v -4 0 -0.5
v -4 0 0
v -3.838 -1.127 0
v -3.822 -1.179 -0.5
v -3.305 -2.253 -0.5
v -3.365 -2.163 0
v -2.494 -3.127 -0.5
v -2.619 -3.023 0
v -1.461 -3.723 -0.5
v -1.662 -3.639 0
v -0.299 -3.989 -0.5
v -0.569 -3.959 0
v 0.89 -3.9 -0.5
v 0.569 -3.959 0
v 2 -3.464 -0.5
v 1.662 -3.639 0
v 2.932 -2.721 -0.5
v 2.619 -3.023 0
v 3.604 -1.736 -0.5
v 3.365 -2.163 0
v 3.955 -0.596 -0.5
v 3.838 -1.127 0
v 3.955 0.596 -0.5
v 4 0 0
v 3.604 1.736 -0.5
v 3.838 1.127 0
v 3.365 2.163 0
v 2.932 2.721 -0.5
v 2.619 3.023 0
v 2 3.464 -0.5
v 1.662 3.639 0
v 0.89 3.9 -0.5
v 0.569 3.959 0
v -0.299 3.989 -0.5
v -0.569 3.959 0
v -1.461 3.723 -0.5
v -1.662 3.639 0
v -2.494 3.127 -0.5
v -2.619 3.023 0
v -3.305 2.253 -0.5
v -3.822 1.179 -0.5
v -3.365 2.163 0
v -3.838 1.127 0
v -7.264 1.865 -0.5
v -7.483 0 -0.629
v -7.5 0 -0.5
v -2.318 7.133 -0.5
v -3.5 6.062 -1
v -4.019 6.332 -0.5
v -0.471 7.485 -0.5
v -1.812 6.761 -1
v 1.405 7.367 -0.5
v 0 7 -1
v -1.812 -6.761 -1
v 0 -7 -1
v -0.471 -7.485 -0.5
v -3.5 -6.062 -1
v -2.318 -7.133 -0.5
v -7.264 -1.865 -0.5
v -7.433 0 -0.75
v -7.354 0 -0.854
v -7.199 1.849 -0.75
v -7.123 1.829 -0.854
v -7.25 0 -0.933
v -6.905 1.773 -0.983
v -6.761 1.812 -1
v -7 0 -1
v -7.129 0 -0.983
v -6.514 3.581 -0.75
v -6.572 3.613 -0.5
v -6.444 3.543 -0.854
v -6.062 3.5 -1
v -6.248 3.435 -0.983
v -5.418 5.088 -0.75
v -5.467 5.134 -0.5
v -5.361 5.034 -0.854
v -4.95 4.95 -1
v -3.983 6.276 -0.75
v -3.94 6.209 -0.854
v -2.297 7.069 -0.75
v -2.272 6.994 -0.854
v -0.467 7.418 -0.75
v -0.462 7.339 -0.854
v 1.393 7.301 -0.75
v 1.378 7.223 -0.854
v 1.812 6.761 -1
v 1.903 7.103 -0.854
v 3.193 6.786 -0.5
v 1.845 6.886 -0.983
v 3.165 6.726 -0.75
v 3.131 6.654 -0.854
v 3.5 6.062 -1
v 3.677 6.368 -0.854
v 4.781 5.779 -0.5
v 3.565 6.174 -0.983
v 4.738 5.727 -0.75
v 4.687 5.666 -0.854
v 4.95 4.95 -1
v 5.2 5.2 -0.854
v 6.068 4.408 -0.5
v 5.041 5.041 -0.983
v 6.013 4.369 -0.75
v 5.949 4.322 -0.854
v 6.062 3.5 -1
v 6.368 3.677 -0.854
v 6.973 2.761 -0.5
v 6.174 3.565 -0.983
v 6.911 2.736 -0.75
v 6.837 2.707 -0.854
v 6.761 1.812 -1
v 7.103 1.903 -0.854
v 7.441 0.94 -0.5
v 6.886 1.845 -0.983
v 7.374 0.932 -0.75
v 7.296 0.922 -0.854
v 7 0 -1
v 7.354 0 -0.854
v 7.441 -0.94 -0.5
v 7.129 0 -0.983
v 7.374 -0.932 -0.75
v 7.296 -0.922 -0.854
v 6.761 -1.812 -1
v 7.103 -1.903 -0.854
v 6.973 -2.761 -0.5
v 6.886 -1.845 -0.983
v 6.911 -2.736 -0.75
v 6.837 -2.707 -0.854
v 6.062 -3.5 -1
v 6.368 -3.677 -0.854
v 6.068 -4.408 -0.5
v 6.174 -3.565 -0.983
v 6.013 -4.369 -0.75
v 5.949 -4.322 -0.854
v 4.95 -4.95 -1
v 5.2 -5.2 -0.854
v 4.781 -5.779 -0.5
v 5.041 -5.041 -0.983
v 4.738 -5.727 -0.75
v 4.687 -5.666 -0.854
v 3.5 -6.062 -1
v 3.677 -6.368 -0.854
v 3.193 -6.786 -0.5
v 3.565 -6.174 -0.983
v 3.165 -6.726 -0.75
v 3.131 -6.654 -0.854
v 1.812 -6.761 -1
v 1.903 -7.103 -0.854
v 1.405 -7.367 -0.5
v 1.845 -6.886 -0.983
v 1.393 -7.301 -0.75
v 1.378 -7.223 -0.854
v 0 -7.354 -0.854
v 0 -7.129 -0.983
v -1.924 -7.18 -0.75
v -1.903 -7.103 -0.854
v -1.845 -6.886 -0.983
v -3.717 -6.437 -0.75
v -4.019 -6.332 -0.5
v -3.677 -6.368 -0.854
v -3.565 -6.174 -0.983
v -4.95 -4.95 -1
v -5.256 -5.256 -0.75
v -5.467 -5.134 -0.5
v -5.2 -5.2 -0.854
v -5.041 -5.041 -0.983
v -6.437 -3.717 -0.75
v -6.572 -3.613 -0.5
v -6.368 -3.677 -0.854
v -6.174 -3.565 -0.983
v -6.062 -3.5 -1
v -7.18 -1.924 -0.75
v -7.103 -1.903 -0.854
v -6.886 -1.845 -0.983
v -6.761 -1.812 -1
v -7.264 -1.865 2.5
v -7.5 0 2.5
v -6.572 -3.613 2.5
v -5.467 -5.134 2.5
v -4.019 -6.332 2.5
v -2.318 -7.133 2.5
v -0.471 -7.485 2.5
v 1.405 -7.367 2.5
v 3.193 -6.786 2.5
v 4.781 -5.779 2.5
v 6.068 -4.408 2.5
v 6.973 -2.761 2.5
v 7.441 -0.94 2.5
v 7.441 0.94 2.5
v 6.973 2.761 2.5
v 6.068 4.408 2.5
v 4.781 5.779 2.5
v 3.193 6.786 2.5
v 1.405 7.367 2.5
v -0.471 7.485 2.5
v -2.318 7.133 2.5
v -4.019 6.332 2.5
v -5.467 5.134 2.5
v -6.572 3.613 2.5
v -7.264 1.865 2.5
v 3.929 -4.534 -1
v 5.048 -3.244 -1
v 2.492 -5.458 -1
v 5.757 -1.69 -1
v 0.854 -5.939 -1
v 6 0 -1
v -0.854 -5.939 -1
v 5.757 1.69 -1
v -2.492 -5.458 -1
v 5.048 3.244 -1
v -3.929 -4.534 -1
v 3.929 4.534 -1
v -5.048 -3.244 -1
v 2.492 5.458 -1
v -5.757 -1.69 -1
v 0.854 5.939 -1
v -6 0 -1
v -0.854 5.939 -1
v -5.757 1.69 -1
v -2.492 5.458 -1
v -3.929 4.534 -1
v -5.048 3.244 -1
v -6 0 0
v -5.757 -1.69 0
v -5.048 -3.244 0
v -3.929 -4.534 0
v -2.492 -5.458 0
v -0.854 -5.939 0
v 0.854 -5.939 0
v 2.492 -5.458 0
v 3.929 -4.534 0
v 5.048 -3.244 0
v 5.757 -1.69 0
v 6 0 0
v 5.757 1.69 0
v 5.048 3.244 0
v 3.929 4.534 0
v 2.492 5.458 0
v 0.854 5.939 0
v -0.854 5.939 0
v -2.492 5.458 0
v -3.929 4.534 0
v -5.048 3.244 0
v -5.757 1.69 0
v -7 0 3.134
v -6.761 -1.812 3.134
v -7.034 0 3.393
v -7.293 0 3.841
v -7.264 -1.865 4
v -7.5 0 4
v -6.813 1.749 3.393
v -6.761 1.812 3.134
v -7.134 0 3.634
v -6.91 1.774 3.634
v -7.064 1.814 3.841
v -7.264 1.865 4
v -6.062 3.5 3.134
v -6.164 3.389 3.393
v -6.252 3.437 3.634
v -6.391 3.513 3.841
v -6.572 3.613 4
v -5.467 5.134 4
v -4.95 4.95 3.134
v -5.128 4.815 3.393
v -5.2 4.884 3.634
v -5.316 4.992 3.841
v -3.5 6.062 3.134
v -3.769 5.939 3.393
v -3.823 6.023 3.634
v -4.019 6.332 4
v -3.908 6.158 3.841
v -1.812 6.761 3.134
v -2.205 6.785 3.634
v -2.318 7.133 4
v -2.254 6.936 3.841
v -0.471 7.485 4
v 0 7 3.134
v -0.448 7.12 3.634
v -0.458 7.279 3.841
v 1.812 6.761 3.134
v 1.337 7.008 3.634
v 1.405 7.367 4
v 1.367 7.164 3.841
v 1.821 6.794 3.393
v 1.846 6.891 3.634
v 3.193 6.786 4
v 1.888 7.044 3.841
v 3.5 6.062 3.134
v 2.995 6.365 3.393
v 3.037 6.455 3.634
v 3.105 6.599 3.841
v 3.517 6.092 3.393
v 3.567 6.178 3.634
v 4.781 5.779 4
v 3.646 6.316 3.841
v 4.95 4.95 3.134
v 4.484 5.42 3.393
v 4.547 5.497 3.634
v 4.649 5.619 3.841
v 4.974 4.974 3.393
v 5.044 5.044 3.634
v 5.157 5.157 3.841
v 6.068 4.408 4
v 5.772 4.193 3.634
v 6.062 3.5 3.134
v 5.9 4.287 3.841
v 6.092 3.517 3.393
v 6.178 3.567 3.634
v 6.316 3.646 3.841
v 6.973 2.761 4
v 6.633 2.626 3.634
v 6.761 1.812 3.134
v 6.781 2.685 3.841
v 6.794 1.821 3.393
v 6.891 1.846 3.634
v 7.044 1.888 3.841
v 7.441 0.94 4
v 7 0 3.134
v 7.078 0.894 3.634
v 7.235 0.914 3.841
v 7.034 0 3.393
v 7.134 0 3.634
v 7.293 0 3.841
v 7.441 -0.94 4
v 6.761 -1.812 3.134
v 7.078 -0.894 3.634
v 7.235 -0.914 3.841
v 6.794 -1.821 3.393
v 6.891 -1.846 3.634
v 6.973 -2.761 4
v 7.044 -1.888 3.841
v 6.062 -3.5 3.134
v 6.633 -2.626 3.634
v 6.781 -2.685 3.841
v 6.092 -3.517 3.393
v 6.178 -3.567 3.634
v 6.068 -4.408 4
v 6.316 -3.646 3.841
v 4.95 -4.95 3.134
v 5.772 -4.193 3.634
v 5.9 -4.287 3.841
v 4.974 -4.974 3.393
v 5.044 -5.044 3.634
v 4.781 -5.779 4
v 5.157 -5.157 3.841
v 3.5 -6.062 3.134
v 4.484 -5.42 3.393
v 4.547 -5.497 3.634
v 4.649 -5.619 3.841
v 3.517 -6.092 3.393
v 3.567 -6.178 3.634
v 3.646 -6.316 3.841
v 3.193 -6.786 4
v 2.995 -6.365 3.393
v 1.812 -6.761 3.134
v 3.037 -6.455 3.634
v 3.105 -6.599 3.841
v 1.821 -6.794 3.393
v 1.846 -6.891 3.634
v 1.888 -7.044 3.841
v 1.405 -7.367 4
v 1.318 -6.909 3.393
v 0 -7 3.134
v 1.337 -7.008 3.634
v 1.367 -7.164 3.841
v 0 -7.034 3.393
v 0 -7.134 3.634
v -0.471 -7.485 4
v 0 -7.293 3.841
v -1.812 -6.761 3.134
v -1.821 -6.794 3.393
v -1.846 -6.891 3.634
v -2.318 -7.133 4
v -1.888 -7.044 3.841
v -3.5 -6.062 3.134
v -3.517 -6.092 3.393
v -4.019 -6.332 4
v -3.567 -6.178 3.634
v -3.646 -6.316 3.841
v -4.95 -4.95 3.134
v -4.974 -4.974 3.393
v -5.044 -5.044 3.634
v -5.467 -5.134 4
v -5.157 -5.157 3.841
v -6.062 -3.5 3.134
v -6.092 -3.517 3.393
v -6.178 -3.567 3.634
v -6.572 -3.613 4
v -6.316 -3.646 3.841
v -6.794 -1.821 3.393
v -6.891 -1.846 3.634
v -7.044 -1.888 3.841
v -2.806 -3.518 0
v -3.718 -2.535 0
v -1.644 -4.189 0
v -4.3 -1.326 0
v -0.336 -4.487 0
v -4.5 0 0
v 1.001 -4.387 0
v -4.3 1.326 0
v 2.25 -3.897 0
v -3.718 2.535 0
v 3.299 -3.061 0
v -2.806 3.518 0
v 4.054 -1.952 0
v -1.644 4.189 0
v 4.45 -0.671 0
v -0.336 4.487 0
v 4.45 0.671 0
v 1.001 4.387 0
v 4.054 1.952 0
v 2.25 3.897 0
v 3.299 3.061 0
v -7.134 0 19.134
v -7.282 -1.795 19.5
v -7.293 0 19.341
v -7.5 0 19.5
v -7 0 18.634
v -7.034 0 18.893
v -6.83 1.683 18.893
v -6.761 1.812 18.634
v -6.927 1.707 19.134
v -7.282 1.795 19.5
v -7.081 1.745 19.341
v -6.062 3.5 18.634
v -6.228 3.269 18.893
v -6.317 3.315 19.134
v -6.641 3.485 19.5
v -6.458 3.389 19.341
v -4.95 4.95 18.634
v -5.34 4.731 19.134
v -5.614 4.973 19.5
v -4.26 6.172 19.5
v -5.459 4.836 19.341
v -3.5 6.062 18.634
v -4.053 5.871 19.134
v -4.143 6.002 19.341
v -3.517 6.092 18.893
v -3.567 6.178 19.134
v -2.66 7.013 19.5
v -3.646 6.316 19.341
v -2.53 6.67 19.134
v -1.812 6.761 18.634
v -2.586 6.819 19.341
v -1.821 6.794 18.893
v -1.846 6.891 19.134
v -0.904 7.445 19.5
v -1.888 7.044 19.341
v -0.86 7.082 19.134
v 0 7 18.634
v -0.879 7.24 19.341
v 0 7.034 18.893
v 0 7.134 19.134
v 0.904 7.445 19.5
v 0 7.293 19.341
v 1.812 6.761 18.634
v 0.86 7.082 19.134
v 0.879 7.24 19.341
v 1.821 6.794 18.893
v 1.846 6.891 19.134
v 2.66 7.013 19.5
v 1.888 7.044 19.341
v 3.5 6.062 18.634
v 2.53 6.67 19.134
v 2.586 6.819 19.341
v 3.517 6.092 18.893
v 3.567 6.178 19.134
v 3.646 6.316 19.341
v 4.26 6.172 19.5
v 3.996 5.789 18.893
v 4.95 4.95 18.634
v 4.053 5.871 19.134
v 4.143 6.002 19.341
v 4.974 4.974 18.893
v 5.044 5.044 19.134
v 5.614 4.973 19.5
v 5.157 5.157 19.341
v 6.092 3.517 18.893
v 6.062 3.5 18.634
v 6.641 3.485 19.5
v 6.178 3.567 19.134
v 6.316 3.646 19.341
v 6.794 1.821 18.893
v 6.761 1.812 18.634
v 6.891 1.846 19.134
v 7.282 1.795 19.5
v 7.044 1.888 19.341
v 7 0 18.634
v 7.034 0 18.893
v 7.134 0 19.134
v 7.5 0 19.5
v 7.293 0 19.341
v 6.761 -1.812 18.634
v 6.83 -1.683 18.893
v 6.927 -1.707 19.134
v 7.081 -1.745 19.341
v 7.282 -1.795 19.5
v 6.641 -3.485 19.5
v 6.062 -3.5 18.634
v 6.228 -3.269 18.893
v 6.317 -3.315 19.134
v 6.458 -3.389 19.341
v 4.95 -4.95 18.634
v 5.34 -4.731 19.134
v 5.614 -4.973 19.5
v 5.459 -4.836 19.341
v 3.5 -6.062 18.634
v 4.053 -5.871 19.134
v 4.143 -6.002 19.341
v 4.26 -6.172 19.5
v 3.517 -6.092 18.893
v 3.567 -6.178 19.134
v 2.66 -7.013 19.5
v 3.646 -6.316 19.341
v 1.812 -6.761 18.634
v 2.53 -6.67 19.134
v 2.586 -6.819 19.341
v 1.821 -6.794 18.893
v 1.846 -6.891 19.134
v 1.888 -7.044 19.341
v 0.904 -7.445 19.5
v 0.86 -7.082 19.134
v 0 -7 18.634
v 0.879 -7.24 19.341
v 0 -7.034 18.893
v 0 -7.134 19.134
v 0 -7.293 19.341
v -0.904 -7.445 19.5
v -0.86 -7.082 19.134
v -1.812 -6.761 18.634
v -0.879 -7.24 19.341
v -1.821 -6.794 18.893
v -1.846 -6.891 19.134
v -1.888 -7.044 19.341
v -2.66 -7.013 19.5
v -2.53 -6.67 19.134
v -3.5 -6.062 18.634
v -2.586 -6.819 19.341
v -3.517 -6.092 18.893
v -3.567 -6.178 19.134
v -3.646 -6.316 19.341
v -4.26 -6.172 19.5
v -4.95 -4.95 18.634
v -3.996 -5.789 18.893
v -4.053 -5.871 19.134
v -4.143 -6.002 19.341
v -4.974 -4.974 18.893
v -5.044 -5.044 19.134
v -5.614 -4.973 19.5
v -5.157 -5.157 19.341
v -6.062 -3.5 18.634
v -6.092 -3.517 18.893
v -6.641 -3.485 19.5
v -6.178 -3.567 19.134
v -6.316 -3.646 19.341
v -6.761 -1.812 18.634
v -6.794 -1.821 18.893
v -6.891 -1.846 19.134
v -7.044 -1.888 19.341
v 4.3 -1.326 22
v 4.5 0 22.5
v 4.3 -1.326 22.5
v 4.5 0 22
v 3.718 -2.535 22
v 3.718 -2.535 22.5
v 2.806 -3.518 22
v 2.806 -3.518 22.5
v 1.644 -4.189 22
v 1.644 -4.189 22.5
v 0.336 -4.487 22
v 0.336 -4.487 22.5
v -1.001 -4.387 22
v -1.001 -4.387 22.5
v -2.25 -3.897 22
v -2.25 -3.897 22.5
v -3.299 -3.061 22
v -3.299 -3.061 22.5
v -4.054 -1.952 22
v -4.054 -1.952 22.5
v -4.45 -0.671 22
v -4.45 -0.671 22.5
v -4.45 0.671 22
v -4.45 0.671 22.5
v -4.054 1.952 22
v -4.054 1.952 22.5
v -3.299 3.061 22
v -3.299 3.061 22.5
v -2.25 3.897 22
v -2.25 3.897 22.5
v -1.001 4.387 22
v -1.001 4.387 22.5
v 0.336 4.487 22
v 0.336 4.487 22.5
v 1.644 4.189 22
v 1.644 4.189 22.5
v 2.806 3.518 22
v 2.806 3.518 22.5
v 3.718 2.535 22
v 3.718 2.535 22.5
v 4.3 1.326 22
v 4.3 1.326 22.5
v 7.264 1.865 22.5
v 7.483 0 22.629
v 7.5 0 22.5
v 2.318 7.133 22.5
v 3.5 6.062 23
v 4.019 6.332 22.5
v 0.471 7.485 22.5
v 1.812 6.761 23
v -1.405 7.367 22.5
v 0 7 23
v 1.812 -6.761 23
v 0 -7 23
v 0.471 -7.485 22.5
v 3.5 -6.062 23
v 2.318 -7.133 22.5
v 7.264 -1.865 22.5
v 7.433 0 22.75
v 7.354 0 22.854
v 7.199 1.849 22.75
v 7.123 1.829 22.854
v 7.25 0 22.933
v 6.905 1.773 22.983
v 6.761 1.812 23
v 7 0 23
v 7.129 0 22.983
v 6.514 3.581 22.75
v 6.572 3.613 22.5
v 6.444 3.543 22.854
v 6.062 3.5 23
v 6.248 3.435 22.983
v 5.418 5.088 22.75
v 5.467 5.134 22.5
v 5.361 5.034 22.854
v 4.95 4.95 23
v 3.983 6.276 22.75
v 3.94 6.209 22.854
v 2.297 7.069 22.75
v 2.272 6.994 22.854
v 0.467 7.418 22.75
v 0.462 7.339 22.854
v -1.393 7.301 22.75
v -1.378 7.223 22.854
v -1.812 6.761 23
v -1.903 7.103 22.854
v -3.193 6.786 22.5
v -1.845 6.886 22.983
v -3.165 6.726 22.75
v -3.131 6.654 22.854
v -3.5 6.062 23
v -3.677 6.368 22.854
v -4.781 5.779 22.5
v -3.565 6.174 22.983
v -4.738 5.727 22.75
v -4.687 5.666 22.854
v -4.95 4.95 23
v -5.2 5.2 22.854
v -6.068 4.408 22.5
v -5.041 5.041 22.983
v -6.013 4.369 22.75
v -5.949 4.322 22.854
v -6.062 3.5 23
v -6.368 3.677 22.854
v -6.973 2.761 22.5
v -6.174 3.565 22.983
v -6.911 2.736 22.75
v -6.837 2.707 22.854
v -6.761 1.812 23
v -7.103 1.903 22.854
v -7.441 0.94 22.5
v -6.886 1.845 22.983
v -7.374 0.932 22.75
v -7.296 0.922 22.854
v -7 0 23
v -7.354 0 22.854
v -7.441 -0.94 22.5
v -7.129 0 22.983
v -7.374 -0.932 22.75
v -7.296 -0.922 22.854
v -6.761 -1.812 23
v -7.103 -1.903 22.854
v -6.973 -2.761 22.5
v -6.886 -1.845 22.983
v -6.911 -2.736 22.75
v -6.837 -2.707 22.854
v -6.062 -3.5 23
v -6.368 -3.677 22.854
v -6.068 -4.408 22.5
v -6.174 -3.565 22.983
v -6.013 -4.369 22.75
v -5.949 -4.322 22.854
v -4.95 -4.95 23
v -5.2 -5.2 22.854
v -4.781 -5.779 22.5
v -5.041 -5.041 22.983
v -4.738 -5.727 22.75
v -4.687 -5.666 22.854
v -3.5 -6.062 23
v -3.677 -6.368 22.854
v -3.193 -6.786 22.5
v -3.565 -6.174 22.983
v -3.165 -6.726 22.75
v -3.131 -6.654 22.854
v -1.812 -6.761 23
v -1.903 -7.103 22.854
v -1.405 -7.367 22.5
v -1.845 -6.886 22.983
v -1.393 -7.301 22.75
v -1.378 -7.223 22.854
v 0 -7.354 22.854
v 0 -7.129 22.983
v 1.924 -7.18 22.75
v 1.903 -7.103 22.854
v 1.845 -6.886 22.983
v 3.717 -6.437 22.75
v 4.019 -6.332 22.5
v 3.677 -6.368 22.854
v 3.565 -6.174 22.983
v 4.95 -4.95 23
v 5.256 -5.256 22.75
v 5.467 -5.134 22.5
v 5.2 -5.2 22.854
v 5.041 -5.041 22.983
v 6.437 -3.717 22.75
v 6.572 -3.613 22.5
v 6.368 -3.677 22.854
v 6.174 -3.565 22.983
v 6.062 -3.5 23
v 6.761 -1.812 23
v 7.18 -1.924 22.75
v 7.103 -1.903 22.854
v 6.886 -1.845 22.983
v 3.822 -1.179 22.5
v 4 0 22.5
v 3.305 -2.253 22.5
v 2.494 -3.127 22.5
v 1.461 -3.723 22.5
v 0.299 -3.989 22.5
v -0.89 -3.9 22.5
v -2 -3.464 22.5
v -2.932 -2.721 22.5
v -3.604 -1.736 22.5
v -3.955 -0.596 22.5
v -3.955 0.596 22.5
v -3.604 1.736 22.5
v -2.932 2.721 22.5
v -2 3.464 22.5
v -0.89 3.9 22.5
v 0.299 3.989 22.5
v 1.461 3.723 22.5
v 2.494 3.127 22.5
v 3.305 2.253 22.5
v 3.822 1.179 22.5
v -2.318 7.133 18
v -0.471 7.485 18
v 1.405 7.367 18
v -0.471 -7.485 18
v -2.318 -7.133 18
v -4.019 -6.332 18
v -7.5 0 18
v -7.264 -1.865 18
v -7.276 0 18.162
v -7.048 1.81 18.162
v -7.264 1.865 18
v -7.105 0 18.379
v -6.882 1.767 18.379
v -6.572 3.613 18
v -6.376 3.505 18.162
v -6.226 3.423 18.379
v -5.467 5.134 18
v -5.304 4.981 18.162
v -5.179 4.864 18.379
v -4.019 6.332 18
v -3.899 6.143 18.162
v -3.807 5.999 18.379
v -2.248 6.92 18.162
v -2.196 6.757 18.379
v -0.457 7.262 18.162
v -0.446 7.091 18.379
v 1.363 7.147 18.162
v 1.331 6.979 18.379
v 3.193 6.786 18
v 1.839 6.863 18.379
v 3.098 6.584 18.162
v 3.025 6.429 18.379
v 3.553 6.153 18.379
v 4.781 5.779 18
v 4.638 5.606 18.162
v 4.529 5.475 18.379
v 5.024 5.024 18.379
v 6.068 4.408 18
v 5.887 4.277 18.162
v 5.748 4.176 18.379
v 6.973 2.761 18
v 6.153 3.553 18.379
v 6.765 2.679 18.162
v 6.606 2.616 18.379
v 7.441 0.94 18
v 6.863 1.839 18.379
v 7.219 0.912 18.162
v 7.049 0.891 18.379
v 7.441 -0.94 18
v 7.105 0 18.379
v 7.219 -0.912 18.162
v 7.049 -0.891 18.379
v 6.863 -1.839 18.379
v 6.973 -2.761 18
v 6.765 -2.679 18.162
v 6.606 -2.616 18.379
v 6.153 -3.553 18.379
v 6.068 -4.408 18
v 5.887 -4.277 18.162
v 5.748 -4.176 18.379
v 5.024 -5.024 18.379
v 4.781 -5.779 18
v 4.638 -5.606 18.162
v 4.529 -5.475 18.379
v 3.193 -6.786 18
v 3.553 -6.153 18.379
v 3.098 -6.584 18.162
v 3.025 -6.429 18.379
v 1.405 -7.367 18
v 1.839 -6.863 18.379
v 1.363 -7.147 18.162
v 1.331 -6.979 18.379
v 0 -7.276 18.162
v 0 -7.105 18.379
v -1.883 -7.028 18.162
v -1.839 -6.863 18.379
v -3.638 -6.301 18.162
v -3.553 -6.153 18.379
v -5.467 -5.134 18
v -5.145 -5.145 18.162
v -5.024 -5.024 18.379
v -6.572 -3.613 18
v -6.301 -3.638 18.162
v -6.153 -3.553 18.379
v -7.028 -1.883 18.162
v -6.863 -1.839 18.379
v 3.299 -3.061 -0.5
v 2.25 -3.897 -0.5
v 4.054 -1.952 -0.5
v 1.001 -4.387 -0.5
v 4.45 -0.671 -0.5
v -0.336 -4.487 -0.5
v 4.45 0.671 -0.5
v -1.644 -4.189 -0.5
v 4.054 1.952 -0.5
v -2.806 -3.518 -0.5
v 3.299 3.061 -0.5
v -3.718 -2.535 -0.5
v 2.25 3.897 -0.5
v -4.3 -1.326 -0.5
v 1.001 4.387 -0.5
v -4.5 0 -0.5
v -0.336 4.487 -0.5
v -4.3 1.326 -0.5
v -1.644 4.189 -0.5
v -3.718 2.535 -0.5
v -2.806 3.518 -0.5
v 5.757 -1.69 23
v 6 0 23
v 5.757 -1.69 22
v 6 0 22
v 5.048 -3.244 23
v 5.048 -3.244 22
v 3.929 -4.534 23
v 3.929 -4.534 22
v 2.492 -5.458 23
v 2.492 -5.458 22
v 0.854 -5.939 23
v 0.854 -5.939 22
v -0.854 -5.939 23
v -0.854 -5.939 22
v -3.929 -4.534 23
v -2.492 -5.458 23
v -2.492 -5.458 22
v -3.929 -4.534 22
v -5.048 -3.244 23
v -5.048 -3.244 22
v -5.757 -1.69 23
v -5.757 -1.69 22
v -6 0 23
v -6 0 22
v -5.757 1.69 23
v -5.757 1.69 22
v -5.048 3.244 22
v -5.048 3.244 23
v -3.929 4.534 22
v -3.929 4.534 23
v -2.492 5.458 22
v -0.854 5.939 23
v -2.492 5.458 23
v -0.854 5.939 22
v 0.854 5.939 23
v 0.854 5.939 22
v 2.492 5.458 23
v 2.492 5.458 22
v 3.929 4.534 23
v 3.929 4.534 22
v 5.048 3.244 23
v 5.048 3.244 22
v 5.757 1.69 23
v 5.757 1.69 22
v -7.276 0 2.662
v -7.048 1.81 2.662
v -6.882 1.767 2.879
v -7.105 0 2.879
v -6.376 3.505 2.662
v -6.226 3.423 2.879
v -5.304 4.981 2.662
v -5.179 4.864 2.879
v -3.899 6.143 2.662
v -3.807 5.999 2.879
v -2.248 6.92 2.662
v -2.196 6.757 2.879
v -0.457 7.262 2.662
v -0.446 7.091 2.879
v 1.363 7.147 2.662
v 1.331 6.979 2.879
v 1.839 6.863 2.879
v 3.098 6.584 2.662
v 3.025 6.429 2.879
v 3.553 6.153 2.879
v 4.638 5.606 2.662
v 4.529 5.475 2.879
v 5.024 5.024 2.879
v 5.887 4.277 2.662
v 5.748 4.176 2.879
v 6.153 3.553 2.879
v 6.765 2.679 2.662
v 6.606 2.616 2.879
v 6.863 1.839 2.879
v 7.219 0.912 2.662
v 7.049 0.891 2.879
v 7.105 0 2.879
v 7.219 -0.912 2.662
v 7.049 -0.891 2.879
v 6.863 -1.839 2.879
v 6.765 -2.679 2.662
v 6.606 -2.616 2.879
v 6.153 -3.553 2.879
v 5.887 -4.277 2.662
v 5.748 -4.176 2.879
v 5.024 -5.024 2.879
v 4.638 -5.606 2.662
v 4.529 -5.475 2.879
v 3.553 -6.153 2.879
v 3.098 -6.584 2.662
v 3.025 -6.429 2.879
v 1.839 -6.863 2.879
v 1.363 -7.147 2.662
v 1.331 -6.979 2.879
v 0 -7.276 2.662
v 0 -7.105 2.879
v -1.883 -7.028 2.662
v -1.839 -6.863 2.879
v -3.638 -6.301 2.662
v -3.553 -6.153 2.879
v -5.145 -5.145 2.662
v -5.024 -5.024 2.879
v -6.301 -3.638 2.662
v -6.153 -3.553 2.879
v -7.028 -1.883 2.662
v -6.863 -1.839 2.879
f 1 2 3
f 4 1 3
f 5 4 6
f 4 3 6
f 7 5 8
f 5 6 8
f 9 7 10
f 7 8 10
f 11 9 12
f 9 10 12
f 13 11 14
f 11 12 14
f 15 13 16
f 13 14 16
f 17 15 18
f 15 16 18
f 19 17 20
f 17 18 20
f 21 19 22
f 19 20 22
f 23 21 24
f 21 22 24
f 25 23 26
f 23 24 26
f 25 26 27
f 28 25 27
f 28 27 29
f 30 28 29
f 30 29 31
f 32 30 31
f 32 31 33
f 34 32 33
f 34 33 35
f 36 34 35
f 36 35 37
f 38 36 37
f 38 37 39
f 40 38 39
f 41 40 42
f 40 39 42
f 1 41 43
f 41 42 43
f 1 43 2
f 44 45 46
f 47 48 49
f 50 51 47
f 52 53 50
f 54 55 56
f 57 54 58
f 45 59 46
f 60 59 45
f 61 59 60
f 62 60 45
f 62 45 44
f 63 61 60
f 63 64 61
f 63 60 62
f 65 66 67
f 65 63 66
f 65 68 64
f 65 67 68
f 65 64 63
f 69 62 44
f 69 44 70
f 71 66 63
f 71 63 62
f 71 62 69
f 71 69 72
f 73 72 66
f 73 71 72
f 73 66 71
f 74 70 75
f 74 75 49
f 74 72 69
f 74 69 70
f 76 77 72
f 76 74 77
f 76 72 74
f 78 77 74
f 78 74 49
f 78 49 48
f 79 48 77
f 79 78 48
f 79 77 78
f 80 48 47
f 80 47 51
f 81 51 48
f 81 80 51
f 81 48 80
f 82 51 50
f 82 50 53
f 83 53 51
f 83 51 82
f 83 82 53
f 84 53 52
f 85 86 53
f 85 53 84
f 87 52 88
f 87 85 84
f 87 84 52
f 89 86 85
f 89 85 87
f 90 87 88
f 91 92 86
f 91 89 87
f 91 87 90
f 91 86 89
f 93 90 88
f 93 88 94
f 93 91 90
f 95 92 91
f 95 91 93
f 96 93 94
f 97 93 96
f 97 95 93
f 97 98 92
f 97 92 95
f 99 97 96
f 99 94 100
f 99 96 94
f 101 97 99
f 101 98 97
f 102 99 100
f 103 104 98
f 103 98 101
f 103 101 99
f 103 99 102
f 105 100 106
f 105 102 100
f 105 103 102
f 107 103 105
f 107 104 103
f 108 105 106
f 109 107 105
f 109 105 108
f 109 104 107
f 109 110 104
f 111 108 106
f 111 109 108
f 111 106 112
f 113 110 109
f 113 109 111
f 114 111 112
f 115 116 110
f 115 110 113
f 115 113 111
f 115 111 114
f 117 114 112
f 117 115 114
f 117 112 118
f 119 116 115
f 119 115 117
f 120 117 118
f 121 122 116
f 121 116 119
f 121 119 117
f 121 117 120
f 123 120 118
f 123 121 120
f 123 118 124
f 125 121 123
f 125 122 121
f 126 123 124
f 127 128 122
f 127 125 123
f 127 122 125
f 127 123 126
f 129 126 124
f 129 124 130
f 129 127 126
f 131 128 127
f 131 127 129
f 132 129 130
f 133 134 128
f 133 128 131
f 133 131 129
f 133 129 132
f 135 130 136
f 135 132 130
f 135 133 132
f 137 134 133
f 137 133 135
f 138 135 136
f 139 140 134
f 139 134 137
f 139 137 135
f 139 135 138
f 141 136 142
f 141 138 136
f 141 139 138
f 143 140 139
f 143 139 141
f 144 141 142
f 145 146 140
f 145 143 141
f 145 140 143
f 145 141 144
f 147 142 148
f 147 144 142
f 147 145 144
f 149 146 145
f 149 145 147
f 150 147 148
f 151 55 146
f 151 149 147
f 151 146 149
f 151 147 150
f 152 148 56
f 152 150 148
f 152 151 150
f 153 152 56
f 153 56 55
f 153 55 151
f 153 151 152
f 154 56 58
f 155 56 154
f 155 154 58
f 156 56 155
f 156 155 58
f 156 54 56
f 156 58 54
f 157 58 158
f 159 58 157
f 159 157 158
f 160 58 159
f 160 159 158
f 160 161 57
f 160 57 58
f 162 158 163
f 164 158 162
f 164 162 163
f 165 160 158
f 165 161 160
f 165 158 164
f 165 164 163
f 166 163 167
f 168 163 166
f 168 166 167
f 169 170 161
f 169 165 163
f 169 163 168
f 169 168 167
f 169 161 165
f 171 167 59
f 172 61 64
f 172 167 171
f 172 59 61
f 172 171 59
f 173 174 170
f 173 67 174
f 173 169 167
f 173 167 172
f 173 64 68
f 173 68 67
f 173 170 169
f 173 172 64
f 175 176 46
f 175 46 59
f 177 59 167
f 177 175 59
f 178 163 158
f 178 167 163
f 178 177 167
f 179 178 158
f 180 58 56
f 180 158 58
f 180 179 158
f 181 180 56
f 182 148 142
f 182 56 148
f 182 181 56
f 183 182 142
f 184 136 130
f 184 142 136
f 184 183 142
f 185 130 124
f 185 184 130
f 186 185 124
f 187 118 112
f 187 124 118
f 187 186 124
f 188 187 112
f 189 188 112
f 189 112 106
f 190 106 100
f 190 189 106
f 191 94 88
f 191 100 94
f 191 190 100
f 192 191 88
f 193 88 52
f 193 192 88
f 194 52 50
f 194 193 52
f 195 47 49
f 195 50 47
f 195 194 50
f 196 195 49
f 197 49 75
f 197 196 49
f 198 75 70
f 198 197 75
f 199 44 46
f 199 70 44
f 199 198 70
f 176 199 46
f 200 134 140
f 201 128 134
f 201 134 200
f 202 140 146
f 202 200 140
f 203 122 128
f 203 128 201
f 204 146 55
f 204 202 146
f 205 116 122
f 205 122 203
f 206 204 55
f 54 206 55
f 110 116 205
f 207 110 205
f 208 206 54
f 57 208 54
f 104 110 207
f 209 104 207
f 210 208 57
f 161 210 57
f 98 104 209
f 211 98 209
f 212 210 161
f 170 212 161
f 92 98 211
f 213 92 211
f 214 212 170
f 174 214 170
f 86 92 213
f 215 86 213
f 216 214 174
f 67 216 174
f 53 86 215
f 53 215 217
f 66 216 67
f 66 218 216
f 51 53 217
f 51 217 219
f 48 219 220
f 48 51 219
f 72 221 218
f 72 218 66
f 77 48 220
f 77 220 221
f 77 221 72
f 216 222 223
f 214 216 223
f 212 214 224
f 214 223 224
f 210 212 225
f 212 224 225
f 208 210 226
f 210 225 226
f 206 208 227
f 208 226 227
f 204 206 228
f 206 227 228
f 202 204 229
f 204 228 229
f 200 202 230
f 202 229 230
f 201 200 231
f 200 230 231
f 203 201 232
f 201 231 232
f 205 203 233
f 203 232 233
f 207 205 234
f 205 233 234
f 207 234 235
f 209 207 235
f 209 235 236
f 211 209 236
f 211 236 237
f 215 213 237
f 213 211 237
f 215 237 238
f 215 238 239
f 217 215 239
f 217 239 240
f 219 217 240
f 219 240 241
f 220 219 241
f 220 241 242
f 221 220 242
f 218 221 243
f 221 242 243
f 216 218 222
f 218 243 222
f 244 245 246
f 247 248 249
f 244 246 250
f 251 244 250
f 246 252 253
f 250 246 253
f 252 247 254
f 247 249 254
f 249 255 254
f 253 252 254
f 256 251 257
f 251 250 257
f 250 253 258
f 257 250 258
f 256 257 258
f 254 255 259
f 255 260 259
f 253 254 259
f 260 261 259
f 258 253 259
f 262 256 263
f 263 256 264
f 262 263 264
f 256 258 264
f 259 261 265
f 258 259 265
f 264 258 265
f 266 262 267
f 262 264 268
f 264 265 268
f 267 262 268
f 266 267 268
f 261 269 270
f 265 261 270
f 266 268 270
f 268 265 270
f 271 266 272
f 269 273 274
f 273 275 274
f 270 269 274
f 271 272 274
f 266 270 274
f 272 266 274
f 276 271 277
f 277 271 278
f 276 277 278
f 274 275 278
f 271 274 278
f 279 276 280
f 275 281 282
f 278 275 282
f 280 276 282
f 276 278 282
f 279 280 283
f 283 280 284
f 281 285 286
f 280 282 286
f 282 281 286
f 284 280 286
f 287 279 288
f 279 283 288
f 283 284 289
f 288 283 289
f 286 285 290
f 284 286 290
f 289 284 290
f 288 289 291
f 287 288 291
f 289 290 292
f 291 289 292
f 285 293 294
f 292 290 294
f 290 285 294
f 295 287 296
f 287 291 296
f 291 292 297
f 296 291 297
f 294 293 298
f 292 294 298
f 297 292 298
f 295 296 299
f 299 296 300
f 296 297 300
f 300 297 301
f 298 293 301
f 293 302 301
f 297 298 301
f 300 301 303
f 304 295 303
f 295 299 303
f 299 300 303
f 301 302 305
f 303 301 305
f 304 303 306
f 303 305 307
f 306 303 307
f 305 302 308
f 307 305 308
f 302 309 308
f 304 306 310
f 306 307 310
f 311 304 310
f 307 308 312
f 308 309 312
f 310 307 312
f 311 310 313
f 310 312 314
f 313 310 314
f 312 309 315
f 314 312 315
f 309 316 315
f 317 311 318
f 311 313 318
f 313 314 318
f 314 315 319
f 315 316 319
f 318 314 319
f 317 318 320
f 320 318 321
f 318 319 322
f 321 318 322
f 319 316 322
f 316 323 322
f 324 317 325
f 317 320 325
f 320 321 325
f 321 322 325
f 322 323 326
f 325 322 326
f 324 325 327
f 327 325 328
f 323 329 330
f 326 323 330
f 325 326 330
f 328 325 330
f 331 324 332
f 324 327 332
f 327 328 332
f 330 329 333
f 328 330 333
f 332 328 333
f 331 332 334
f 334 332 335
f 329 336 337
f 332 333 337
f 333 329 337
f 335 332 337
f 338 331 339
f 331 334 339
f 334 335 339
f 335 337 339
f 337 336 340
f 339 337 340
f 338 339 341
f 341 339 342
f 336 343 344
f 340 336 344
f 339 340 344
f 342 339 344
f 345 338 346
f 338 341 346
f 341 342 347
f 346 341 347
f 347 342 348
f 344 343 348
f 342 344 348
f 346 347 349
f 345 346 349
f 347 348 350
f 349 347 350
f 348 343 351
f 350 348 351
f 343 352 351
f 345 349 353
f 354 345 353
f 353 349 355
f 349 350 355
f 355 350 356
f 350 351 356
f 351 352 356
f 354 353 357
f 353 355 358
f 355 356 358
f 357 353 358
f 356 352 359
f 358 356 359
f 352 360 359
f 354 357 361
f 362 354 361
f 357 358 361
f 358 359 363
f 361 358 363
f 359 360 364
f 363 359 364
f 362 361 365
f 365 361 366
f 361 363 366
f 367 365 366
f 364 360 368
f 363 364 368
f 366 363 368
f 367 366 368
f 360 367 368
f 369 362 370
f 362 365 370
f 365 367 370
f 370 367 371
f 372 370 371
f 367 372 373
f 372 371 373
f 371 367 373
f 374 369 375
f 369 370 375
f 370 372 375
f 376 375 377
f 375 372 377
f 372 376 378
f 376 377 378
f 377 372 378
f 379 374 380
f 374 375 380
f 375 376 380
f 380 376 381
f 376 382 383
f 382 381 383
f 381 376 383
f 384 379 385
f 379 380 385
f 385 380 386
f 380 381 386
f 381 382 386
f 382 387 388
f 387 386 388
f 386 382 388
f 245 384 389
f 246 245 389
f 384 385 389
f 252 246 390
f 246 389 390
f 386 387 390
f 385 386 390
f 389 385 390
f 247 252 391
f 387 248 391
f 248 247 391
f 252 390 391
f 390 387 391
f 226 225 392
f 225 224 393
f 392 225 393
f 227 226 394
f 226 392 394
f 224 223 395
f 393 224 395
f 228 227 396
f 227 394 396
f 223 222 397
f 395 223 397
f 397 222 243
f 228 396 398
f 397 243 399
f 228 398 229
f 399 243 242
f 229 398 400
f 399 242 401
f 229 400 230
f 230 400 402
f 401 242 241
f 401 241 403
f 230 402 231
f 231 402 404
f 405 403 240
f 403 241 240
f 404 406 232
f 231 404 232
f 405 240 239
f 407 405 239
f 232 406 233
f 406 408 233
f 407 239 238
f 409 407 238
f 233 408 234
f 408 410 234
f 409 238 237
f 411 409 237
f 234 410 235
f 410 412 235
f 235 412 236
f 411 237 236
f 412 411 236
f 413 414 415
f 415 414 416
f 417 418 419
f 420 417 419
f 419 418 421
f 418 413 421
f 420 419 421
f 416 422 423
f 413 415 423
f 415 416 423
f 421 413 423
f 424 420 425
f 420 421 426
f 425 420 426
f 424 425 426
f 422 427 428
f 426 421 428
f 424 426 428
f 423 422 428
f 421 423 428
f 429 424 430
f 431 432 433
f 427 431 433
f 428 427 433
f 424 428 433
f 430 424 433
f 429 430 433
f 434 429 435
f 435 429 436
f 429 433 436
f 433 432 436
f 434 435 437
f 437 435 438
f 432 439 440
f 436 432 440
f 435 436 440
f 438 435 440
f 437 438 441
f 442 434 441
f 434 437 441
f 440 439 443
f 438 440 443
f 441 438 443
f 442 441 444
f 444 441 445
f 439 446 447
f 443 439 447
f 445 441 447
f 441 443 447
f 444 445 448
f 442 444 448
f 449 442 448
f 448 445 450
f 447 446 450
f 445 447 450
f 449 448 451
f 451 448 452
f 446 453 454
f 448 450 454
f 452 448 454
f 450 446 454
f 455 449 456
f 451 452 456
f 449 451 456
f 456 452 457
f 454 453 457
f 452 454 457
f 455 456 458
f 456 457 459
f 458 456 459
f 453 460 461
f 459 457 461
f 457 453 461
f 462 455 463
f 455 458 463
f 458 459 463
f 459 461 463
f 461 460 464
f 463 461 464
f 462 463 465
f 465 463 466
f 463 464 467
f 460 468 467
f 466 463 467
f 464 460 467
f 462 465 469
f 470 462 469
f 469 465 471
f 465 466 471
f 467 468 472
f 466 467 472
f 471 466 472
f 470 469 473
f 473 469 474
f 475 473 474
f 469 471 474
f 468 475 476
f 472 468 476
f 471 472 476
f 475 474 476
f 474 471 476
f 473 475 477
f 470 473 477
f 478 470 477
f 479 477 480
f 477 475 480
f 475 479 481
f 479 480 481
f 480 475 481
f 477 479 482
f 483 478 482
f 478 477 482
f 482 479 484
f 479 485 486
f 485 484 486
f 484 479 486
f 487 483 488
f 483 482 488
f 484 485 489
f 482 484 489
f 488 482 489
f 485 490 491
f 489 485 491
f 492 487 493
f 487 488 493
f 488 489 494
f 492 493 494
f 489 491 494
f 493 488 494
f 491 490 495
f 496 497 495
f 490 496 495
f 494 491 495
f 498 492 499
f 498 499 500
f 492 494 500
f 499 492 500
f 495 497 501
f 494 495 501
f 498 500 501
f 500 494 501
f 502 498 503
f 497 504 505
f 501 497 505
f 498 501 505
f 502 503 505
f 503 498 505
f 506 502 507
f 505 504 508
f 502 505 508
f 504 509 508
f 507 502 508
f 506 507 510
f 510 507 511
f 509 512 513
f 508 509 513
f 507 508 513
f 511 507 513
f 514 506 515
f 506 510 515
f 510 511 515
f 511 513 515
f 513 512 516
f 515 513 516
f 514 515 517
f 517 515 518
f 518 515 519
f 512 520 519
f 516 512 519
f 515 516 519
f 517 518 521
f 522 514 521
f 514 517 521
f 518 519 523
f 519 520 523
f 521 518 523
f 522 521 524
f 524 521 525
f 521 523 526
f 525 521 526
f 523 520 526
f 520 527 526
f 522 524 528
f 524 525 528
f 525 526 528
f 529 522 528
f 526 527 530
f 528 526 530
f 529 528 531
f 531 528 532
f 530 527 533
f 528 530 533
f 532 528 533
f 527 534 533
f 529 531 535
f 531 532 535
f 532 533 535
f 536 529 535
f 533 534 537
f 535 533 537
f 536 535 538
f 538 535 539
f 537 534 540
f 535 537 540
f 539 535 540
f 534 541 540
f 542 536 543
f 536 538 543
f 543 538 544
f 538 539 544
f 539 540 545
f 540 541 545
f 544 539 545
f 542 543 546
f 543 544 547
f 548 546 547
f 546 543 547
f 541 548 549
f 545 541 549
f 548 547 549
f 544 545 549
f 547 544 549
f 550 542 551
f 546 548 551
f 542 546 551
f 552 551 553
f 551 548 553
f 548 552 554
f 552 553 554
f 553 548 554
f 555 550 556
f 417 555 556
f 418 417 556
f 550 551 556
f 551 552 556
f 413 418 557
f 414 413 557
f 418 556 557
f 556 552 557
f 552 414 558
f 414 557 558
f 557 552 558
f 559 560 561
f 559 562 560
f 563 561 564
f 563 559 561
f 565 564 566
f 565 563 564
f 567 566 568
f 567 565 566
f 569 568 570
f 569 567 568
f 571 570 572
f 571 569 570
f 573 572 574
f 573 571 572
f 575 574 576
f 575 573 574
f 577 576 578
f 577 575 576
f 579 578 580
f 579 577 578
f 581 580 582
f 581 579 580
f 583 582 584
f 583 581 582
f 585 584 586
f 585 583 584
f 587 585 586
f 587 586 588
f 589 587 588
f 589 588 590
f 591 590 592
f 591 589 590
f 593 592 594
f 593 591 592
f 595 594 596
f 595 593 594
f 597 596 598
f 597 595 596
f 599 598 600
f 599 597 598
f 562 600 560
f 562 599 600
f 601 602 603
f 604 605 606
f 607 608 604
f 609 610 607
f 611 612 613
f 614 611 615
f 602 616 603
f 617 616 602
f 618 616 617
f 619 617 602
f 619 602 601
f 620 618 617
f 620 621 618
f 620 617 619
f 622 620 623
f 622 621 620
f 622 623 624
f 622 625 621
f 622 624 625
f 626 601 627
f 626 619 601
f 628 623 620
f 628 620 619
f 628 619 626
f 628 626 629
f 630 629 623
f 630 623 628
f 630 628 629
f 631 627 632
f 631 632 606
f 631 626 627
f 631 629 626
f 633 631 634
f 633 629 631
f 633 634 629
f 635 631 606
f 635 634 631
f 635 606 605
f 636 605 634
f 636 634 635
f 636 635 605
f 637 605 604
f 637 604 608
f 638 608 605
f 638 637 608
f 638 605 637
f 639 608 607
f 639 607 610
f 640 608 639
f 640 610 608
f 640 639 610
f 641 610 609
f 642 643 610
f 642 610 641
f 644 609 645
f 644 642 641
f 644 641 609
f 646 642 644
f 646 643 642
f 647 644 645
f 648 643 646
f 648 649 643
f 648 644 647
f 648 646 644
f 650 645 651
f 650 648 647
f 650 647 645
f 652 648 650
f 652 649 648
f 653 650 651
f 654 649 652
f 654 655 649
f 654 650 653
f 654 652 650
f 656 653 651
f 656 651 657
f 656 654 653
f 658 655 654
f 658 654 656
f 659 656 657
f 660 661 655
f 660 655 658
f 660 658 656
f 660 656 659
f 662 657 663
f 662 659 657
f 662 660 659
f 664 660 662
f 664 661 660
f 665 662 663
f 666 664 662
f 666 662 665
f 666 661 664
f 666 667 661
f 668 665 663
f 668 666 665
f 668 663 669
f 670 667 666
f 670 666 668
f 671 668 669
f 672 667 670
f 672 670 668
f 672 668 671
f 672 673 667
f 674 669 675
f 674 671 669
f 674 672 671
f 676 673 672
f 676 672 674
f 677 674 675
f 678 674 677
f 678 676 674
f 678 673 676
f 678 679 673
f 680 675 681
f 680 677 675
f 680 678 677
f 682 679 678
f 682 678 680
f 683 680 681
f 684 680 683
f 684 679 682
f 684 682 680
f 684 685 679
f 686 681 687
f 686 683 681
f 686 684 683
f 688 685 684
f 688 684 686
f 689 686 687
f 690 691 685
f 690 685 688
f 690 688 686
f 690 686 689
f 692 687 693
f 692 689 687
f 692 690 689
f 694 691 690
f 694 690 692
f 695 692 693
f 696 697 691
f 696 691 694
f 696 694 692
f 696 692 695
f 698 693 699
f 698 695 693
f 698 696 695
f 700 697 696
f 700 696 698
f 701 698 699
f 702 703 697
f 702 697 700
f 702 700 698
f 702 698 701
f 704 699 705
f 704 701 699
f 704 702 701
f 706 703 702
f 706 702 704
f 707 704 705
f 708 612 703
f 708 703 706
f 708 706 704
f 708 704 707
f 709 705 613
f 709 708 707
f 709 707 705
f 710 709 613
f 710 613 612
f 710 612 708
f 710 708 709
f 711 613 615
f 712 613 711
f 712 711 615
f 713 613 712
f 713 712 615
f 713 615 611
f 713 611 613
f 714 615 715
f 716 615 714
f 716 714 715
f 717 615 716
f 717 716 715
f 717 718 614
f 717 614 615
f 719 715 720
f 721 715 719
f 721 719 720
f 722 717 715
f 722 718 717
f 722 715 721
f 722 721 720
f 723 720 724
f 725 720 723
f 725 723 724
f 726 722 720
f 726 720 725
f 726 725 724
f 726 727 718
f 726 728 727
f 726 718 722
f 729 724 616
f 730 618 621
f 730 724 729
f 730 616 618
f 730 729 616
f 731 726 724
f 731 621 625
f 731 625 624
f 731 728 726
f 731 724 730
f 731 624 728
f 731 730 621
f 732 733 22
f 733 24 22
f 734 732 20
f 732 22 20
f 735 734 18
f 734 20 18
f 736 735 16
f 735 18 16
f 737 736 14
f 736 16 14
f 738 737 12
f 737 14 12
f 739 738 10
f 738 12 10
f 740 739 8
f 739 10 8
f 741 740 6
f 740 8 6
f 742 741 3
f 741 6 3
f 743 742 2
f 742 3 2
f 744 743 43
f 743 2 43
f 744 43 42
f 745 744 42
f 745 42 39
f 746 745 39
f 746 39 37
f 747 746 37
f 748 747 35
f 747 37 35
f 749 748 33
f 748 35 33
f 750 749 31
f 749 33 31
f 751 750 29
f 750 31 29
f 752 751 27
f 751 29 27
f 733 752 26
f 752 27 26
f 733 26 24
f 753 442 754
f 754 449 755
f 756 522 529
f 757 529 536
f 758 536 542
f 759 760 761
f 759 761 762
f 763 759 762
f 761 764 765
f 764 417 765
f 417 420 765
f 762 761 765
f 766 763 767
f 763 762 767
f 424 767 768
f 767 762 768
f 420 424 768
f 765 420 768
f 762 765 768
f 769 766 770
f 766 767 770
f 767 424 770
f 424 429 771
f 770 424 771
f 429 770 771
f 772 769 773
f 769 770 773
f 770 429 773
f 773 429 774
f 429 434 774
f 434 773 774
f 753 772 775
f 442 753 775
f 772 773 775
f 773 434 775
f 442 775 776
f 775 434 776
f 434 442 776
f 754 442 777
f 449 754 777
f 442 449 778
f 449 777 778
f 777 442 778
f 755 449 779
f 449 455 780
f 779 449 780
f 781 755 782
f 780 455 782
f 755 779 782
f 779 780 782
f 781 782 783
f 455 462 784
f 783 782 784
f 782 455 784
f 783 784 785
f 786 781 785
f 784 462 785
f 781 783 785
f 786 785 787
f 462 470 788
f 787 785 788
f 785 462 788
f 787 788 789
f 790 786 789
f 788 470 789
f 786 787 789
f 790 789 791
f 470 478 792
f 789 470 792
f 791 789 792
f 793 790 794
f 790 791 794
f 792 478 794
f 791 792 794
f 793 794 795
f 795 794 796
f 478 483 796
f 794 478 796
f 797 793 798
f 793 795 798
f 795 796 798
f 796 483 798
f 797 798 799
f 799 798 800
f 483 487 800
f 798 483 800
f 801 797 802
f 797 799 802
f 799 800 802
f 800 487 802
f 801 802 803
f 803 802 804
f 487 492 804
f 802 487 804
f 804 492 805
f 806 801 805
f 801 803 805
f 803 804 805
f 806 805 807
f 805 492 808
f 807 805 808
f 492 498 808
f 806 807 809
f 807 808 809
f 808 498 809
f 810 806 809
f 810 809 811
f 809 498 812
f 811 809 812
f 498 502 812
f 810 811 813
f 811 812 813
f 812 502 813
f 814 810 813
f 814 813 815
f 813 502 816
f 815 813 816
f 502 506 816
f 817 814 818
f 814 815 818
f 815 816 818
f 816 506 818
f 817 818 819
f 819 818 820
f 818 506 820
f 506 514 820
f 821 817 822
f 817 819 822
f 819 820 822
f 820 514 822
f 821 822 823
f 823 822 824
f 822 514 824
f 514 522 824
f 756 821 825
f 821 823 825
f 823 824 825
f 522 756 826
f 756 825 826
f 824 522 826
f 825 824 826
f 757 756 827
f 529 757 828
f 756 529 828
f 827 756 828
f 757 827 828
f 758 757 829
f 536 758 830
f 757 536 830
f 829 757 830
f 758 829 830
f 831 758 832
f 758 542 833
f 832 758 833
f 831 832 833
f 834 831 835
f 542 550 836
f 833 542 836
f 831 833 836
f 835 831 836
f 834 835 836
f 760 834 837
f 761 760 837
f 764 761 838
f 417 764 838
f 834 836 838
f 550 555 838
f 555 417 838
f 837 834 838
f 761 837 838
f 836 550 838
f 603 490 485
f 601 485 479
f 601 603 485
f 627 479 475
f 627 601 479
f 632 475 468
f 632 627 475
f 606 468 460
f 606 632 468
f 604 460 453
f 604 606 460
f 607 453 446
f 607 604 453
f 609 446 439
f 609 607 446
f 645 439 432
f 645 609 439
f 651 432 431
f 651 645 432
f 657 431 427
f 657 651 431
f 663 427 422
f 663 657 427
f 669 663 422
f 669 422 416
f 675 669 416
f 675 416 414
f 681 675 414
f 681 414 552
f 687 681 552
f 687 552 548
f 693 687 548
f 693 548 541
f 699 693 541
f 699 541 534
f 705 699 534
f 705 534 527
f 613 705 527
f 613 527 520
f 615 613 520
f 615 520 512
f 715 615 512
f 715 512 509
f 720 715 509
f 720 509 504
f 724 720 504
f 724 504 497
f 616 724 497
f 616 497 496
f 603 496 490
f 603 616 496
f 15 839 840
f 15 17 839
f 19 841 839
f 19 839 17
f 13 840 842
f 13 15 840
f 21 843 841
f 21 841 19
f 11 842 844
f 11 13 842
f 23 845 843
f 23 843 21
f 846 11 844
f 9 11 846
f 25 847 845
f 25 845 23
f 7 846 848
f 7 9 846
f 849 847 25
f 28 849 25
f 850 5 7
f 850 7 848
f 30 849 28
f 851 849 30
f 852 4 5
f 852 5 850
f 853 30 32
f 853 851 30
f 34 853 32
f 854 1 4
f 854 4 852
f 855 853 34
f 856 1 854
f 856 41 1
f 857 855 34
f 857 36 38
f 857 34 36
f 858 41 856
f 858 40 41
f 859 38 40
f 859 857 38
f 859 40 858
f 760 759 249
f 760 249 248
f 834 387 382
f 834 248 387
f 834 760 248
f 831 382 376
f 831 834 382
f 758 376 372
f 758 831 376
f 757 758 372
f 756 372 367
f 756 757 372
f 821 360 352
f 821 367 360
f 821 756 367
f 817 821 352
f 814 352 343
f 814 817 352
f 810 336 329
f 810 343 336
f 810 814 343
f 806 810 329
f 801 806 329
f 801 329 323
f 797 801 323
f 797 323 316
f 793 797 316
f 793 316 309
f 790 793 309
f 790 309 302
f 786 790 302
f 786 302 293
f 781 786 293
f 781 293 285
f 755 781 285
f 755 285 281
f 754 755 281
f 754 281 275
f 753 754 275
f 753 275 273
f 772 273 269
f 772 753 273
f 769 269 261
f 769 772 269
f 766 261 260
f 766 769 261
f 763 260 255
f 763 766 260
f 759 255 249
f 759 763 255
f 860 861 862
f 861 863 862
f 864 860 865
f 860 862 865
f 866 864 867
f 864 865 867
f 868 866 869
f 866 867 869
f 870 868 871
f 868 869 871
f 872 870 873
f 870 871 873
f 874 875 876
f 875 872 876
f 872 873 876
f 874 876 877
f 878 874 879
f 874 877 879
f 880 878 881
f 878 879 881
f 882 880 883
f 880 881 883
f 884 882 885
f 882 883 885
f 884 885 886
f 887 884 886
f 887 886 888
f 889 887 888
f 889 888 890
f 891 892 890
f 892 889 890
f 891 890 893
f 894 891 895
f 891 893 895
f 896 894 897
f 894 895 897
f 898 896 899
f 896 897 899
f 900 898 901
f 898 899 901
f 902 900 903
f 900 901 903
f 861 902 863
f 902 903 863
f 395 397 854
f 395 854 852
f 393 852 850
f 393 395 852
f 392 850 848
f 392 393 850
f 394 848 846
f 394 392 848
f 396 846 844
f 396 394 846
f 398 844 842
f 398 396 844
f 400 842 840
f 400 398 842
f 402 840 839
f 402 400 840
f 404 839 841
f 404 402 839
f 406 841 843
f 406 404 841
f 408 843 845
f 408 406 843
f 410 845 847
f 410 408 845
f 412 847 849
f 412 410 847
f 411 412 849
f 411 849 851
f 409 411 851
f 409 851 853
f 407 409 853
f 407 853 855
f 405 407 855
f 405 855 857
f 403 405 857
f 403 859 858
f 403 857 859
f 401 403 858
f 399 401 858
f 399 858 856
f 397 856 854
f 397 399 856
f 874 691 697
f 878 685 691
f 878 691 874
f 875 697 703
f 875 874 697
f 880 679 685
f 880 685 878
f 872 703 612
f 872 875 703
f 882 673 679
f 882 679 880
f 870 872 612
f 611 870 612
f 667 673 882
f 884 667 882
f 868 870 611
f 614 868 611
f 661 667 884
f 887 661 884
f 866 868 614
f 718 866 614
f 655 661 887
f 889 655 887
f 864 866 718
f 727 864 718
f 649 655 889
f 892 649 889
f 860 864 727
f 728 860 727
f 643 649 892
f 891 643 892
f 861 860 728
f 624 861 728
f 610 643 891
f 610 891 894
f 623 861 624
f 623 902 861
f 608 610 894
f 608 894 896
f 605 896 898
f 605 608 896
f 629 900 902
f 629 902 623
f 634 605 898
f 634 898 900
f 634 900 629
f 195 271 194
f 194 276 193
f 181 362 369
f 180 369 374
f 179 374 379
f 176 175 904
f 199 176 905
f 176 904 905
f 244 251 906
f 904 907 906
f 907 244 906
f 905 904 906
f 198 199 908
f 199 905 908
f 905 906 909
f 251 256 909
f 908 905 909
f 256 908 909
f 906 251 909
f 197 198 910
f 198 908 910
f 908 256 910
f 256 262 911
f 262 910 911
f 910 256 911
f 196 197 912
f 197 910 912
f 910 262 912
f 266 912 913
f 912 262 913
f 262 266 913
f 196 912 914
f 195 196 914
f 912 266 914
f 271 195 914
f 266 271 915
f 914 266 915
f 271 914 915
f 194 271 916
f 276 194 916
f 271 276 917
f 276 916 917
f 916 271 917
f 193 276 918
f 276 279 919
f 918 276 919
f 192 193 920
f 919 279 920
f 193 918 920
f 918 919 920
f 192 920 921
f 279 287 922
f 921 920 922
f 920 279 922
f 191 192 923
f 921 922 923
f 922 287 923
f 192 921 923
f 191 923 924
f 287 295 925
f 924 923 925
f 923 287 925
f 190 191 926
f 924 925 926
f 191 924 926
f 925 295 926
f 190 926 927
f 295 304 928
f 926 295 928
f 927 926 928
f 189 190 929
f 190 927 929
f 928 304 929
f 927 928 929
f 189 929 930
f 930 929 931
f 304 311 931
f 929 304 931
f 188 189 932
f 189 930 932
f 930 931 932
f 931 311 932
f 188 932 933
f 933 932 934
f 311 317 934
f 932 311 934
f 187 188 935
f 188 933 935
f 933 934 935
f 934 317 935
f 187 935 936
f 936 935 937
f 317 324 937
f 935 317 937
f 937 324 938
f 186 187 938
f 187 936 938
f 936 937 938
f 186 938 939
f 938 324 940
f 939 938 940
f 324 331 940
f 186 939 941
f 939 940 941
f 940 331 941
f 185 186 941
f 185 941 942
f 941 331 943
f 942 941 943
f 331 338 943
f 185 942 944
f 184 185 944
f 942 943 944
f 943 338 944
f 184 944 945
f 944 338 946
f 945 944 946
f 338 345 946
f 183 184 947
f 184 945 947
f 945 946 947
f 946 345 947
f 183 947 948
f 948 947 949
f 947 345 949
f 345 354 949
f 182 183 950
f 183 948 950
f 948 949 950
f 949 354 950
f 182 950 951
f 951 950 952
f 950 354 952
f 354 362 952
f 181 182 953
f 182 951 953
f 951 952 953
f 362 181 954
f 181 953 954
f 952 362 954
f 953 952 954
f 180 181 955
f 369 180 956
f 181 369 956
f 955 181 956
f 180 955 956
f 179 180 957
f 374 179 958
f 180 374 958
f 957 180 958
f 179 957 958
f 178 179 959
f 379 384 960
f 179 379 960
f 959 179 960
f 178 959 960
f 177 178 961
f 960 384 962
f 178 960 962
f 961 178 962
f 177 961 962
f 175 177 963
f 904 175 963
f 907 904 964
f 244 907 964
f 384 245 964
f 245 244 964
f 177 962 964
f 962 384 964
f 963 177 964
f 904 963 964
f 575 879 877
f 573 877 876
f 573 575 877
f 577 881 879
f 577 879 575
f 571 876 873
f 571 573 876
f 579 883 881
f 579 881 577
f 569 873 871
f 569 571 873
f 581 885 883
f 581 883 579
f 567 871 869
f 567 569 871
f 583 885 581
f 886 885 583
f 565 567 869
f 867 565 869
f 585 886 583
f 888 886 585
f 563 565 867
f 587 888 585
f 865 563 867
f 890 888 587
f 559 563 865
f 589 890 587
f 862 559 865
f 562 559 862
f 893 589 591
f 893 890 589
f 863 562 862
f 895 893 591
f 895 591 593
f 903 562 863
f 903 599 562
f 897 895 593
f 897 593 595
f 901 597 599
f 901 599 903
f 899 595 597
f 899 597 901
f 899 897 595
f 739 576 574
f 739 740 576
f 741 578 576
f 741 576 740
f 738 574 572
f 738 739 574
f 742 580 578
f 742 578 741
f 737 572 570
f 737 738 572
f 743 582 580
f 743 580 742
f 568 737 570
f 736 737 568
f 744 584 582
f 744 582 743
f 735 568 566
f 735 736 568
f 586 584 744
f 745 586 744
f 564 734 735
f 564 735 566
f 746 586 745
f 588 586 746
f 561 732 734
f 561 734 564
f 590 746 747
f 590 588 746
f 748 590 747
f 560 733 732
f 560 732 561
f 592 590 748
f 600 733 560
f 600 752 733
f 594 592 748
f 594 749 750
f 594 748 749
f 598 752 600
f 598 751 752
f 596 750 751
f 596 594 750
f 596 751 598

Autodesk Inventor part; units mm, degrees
ref_plane "YZ Plane" through (0, 0, 0) normal (1, 0, 0) x (0, 1, 0)
ref_plane "XZ Plane" through (0, 0, 0) normal (0, 1, 0) x (-1, 0, 0)
ref_plane "XY Plane" through (0, 0, 0) normal (0, 0, 1) x (1, 0, 0)
sketch "Sketch1" plane through (0, 0, 0) normal (0, 0, 1) x (1, 0, 0)
  circle A0 centre (0, 0) radius 4
  circle A1 centre (0, 0) radius 6
  dimension "d0" = 8
  dimension "d2" = 12
sketch "Sketch1 outline for Extrusion1" plane through (0, 0, 0) normal (0, 0, 1) x (1, 0, 0)
  circle A0 centre (0, 0) radius 6
  circle A1 centre (0, 0) radius 4
extrude "Extrusion1" add sketch "Sketch1 outline for Extrusion1" along normal blind 22
sketch "Sketch2" plane through (0, 0, 22) normal (0, 0, 1) x (1, 0, 0)
  circle A0 centre (0, 0) radius 6 projected
  circle A1 centre (0, 0) radius 7.5
  dimension "d5" = 15
sketch "Sketch2 outline for Extrusion2" plane through (0, 0, 22) normal (0, 0, 1) x (1, 0, 0)
  circle A0 centre (0, 0) radius 7.5
  circle A1 centre (0, 0) radius 6
extrude "Extrusion2" add sketch "Sketch2 outline for Extrusion2" along normal blind 1 and the other way blind 2.5
sketch "Sketch3" plane through (0, 0, 19.5) normal (0, 0, -1) x (-1, 0, 0)
  circle A0 centre (0, 0) radius 6 projected
  circle A1 centre (0, 0) radius 7.5 projected
  circle A2 centre (0, 0) radius 7
  dimension "d11" = 14
sketch "Sketch3 outline for Extrusion3" plane through (0, 0, 19.5) normal (0, 0, -1) x (-1, 0, 0)
  circle A0 centre (0, 0) radius 7
  circle A1 centre (0, 0) radius 6
extrude "Extrusion3" add sketch "Sketch3 outline for Extrusion3" along normal blind 1.5
sketch "Sketch4" plane through (0, 0, 18) normal (0, 0, -1) x (-1, 0, 0)
  circle A0 centre (0, 0) radius 6 projected
  circle A1 centre (0, 0) radius 7 projected
  circle A2 centre (0, 0) radius 7.5
  dimension "d15" = 15
sketch "Sketch4 outline for Extrusion4" plane through (0, 0, 18) normal (0, 0, -1) x (-1, 0, 0)
  circle A0 centre (0, 0) radius 7.5
  circle A1 centre (0, 0) radius 6
extrude "Extrusion4" add sketch "Sketch4 outline for Extrusion4" along normal blind 14
sketch "Sketch5" plane through (0, 0, 4) normal (0, 0, -1) x (-1, 0, 0)
  circle A0 centre (0, 0) radius 6 projected
  circle A1 centre (0, 0) radius 7.5 projected
  circle A2 centre (0, 0) radius 7
  dimension "d19" = 14
sketch "Sketch5 outline for Extrusion5" plane through (0, 0, 4) normal (0, 0, -1) x (-1, 0, 0)
  circle A0 centre (0, 0) radius 7
  circle A1 centre (0, 0) radius 6
extrude "Extrusion5" add sketch "Sketch5 outline for Extrusion5" along normal blind 1.5
sketch "Sketch6" plane through (0, 0, 2.5) normal (0, 0, -1) x (-1, 0, 0)
  circle A0 centre (0, 0) radius 6 projected
  circle A1 centre (0, 0) radius 7 projected
  circle A2 centre (0, 0) radius 7.5
  dimension "d23" = 15
sketch "Sketch6 outline for Extrusion6" plane through (0, 0, 2.5) normal (0, 0, -1) x (-1, 0, 0)
  circle A0 centre (0, 0) radius 7.5
  circle A1 centre (0, 0) radius 6
extrude "Extrusion6" add sketch "Sketch6 outline for Extrusion6" along normal blind 3.5
fillet "Fillet1" radius 1 4 edges at (7, 0, 19.5) (7, 0, 4) (7, 0, 2.5) (7, 0, 18)
fillet "Fillet2" radius 0.5 2 edges at (-7.5, 0, 23) (7.5, 0, -1)
sketch "Sketch7" plane through (0, 0, 22) normal (0, 0, 1) x (1, 0, 0)
  circle A0 centre (0, 0) radius 4 projected
  circle A1 centre (0, 0) radius 6 projected
  circle A2 centre (0, 0) radius 4.5
  dimension "d29" = 9
sketch "Sketch7 outline for Extrusion7" plane through (0, 0, 22) normal (0, 0, 1) x (1, 0, 0)
  circle A0 centre (0, 0) radius 4.5
  circle A1 centre (0, 0) radius 4
extrude "Extrusion7" add sketch "Sketch7 outline for Extrusion7" along normal blind 0.5
sketch "Sketch8" plane through (0, 0, 0) normal (0, 0, -1) x (-1, 0, 0)
  circle A0 centre (0, 0) radius 4 projected
  circle A1 centre (0, 0) radius 6 projected
  circle A2 centre (0, 0) radius 4.5
  dimension "d34" = 9
sketch "Sketch8 outline for Extrusion8" plane through (0, 0, 0) normal (0, 0, -1) x (-1, 0, 0)
  circle A0 centre (0, 0) radius 4.5
  circle A1 centre (0, 0) radius 4
extrude "Extrusion8" add sketch "Sketch8 outline for Extrusion8" along normal blind 0.5
properties part number "lineair bearing 8 x15 x 24"
